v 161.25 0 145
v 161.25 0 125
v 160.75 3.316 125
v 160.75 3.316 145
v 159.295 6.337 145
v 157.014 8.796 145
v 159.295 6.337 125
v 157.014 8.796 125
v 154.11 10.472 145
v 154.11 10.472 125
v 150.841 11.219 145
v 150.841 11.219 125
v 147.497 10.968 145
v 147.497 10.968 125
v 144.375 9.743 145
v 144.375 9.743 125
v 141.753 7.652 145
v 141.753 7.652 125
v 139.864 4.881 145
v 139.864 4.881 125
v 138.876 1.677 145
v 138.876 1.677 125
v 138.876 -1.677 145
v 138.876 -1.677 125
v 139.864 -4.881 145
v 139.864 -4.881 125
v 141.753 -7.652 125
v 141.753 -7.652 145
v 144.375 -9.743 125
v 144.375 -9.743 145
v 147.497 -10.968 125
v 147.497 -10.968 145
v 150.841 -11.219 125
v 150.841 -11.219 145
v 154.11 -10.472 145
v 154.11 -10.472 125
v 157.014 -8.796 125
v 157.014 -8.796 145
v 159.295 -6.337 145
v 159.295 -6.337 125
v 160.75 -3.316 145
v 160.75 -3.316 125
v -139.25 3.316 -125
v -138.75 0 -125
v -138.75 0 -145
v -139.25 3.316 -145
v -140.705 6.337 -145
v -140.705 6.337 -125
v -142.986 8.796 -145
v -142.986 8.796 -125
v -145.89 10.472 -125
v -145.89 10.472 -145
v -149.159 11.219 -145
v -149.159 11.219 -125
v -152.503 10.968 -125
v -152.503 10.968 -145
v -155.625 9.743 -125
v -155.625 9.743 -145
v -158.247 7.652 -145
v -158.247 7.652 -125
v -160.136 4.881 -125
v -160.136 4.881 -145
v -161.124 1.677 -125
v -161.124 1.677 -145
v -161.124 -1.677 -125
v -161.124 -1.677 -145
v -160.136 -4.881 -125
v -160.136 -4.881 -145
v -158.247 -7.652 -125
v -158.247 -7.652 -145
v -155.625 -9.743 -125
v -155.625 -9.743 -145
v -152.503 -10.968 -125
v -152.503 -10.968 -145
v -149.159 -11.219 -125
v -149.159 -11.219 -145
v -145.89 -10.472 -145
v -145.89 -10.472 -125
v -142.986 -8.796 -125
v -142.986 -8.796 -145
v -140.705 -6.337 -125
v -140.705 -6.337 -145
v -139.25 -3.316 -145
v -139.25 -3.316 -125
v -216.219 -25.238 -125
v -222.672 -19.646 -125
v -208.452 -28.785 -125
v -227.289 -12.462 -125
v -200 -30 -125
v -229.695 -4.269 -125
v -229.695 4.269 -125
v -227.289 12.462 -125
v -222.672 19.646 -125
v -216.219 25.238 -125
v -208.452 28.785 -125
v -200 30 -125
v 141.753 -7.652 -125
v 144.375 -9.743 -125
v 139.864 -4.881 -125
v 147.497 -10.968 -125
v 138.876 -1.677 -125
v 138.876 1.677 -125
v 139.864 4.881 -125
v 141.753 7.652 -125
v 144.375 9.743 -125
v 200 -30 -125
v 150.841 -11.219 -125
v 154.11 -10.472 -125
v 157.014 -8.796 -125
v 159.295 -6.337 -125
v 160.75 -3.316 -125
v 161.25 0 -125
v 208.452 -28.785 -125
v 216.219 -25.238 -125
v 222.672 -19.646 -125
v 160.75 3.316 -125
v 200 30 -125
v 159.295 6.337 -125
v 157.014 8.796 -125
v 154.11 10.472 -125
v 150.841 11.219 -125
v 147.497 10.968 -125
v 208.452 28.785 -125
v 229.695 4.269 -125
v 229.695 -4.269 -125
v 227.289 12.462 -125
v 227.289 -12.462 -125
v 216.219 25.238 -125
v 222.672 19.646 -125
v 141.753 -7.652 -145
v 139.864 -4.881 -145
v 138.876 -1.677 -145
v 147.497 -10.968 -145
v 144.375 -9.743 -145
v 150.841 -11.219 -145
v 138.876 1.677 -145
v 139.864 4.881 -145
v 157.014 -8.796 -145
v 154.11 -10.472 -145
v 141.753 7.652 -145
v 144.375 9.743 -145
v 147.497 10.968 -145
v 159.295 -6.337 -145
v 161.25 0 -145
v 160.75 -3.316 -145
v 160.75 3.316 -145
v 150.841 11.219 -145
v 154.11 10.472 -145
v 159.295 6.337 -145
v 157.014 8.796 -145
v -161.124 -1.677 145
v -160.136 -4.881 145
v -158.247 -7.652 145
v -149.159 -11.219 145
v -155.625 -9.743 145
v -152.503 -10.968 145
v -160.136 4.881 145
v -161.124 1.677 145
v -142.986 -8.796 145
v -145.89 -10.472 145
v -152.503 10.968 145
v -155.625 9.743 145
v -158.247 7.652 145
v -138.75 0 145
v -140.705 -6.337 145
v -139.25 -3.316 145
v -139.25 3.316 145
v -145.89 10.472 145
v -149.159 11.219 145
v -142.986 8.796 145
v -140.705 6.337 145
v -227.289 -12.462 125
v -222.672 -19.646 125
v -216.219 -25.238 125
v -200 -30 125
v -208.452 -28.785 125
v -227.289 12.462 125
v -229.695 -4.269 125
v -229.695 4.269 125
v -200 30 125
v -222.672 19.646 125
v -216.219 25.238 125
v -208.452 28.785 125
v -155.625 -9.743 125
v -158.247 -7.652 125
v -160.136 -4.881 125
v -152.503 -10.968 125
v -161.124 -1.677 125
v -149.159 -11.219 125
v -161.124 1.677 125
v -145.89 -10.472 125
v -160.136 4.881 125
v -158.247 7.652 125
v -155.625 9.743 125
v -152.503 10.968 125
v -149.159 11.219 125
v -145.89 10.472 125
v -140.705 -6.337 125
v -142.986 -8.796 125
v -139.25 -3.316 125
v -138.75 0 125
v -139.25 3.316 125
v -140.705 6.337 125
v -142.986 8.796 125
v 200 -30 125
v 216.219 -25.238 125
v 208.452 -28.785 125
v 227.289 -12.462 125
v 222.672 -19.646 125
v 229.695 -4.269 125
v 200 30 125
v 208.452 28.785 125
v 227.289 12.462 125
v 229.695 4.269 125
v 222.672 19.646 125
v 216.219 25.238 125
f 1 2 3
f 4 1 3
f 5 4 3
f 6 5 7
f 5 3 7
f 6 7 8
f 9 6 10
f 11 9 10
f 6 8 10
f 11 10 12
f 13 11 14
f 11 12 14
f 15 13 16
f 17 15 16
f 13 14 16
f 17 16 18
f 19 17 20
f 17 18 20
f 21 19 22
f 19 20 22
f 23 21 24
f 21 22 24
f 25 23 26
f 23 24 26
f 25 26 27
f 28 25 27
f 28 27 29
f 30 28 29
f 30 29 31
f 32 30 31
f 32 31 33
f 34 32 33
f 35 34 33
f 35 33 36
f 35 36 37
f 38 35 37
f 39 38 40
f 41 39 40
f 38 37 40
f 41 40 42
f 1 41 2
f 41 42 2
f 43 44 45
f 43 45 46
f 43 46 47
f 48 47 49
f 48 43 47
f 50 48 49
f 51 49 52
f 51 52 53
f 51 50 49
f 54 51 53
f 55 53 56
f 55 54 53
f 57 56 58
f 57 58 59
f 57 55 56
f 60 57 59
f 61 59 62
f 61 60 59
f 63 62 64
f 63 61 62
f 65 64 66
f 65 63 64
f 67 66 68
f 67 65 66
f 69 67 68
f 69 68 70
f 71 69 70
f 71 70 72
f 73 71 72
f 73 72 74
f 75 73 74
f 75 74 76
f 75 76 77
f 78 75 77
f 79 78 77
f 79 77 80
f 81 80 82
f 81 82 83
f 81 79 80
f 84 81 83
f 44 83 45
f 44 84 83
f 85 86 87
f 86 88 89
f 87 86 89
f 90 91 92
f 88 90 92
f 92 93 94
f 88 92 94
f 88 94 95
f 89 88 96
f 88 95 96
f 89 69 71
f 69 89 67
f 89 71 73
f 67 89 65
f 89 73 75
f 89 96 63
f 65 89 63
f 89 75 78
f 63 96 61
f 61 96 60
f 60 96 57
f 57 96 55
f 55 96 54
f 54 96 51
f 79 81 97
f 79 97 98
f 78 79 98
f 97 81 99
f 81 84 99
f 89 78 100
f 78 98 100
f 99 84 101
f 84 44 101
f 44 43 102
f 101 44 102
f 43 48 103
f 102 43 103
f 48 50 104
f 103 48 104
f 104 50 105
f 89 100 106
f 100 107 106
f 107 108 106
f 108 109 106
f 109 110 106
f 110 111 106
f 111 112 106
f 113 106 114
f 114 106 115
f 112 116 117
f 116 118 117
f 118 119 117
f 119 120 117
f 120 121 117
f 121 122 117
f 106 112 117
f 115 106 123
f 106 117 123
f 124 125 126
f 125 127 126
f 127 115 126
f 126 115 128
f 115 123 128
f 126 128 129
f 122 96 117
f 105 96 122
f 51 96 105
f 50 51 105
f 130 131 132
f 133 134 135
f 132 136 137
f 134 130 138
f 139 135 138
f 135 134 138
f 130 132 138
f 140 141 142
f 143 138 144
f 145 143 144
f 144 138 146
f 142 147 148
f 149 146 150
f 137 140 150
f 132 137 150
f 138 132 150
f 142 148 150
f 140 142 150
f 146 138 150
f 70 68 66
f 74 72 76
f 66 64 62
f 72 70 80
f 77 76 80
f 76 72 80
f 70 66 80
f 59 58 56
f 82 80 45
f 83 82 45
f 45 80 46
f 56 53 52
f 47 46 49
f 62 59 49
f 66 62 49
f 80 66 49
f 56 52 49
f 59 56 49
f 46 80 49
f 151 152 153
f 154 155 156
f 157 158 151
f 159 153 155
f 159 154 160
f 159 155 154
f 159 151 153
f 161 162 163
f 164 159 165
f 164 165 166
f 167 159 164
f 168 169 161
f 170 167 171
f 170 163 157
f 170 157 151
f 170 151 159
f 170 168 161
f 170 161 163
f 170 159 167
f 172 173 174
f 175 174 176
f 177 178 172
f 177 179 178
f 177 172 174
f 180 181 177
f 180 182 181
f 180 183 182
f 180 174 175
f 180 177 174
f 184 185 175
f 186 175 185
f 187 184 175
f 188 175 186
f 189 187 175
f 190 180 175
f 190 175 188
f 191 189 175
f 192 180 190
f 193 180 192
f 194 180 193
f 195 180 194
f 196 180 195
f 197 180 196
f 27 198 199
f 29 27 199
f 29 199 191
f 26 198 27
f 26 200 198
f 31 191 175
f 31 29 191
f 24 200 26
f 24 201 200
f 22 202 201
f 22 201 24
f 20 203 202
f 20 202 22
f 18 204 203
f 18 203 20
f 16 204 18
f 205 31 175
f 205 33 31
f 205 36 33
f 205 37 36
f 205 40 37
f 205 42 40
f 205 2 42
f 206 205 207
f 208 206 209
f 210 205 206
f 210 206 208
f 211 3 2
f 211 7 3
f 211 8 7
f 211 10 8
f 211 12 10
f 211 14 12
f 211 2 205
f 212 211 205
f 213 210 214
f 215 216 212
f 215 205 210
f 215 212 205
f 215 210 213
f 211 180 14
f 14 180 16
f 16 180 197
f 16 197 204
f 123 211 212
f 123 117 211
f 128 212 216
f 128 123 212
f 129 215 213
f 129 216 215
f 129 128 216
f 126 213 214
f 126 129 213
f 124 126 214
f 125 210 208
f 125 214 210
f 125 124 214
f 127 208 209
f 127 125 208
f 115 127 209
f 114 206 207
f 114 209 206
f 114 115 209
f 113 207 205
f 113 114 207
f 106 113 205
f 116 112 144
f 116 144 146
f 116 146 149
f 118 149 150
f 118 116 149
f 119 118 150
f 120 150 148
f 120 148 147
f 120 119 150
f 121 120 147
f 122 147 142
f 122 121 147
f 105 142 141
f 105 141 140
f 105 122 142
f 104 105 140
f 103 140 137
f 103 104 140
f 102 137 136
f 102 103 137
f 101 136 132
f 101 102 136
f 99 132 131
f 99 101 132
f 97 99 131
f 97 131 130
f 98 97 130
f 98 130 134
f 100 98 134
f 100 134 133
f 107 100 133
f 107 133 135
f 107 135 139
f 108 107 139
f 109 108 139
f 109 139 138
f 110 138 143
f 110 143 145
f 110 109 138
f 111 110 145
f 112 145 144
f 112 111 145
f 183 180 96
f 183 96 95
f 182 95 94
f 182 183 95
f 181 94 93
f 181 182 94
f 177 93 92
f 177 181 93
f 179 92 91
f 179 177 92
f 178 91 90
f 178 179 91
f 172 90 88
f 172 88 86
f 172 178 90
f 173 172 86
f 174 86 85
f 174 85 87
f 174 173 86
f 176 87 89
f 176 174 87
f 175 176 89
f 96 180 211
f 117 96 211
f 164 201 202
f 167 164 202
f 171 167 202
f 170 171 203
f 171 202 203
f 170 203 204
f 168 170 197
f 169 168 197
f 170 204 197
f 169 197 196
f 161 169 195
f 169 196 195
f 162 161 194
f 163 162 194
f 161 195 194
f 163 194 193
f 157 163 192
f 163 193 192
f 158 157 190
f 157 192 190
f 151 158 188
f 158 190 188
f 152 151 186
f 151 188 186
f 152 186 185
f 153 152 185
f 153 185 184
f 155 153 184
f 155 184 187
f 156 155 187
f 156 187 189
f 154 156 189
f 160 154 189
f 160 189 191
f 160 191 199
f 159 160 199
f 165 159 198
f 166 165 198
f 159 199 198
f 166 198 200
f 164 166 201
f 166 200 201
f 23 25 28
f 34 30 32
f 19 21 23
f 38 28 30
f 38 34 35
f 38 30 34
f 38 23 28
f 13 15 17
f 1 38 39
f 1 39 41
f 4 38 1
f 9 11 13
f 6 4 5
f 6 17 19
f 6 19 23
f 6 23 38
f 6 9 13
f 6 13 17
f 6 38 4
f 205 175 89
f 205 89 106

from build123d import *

# Parameters (mm, degrees)
SKETCH2_W           = 460
SKETCH2_H           = 60
BOSS_EXTRUDE1_DEPTH = 125
FILLET1_RADIUS      = 30
FILLET1_LENGTH      = 250
FILLET2_RADIUS      = 30
FILLET2_LENGTH      = 250
SKETCH3_R           = 11.25
BOSS_EXTRUDE2_DEPTH = 20


with BuildPart() as part:
    # Sketch2 → Boss-Extrude1 (new, symmetric)
    with BuildSketch(Plane.XY):
        Rectangle(SKETCH2_W, SKETCH2_H)
    extrude(amount=BOSS_EXTRUDE1_DEPTH, both=True)

    # Fillet1: full round fillet: the end face becomes a half cylinder, R = half its width
    fillet1_face = Plane((-230, 0, 0), x_dir=(0, 0, 1), z_dir=(-1, 0, 0))  # on the end face: x along it, z out of the body
    fillet1_slab = fillet1_face.offset(-FILLET1_RADIUS / 2) * Box(FILLET1_LENGTH, 2 * FILLET1_RADIUS, FILLET1_RADIUS, mode=Mode.PRIVATE)  # the body's end, R deep
    fillet1_round = Plane((-200, 0, 0), x_dir=(-1, 0, 0), z_dir=(0, 0, 1)) * Cylinder(FILLET1_RADIUS, FILLET1_LENGTH, mode=Mode.PRIVATE)  # its axis R under the face
    add(fillet1_slab - fillet1_round, mode=Mode.SUBTRACT)

    # Fillet2: full round fillet: the end face becomes a half cylinder, R = half its width
    fillet2_face = Plane((230, 0, 0), x_dir=(0, 0, -1), z_dir=(1, 0, 0))  # on the end face: x along it, z out of the body
    fillet2_slab = fillet2_face.offset(-FILLET2_RADIUS / 2) * Box(FILLET2_LENGTH, 2 * FILLET2_RADIUS, FILLET2_RADIUS, mode=Mode.PRIVATE)  # the body's end, R deep
    fillet2_round = Plane((200, 0, 0), x_dir=(1, 0, 0), z_dir=(0, 0, -1)) * Cylinder(FILLET2_RADIUS, FILLET2_LENGTH, mode=Mode.PRIVATE)  # its axis R under the face
    add(fillet2_slab - fillet2_round, mode=Mode.SUBTRACT)

    # Sketch3 → Boss-Extrude2 (add)
    with BuildSketch(Plane.XY.offset(125)):
        with Locations((-150, 0)):
            Circle(SKETCH3_R)
        with Locations((150, 0)):
            Circle(SKETCH3_R)
    boss_extrude2 = extrude(amount=BOSS_EXTRUDE2_DEPTH)

    # Mirror1: Boss-Extrude2 across plane
    add(boss_extrude2.mirror(Plane.XY))


solid = part.part
